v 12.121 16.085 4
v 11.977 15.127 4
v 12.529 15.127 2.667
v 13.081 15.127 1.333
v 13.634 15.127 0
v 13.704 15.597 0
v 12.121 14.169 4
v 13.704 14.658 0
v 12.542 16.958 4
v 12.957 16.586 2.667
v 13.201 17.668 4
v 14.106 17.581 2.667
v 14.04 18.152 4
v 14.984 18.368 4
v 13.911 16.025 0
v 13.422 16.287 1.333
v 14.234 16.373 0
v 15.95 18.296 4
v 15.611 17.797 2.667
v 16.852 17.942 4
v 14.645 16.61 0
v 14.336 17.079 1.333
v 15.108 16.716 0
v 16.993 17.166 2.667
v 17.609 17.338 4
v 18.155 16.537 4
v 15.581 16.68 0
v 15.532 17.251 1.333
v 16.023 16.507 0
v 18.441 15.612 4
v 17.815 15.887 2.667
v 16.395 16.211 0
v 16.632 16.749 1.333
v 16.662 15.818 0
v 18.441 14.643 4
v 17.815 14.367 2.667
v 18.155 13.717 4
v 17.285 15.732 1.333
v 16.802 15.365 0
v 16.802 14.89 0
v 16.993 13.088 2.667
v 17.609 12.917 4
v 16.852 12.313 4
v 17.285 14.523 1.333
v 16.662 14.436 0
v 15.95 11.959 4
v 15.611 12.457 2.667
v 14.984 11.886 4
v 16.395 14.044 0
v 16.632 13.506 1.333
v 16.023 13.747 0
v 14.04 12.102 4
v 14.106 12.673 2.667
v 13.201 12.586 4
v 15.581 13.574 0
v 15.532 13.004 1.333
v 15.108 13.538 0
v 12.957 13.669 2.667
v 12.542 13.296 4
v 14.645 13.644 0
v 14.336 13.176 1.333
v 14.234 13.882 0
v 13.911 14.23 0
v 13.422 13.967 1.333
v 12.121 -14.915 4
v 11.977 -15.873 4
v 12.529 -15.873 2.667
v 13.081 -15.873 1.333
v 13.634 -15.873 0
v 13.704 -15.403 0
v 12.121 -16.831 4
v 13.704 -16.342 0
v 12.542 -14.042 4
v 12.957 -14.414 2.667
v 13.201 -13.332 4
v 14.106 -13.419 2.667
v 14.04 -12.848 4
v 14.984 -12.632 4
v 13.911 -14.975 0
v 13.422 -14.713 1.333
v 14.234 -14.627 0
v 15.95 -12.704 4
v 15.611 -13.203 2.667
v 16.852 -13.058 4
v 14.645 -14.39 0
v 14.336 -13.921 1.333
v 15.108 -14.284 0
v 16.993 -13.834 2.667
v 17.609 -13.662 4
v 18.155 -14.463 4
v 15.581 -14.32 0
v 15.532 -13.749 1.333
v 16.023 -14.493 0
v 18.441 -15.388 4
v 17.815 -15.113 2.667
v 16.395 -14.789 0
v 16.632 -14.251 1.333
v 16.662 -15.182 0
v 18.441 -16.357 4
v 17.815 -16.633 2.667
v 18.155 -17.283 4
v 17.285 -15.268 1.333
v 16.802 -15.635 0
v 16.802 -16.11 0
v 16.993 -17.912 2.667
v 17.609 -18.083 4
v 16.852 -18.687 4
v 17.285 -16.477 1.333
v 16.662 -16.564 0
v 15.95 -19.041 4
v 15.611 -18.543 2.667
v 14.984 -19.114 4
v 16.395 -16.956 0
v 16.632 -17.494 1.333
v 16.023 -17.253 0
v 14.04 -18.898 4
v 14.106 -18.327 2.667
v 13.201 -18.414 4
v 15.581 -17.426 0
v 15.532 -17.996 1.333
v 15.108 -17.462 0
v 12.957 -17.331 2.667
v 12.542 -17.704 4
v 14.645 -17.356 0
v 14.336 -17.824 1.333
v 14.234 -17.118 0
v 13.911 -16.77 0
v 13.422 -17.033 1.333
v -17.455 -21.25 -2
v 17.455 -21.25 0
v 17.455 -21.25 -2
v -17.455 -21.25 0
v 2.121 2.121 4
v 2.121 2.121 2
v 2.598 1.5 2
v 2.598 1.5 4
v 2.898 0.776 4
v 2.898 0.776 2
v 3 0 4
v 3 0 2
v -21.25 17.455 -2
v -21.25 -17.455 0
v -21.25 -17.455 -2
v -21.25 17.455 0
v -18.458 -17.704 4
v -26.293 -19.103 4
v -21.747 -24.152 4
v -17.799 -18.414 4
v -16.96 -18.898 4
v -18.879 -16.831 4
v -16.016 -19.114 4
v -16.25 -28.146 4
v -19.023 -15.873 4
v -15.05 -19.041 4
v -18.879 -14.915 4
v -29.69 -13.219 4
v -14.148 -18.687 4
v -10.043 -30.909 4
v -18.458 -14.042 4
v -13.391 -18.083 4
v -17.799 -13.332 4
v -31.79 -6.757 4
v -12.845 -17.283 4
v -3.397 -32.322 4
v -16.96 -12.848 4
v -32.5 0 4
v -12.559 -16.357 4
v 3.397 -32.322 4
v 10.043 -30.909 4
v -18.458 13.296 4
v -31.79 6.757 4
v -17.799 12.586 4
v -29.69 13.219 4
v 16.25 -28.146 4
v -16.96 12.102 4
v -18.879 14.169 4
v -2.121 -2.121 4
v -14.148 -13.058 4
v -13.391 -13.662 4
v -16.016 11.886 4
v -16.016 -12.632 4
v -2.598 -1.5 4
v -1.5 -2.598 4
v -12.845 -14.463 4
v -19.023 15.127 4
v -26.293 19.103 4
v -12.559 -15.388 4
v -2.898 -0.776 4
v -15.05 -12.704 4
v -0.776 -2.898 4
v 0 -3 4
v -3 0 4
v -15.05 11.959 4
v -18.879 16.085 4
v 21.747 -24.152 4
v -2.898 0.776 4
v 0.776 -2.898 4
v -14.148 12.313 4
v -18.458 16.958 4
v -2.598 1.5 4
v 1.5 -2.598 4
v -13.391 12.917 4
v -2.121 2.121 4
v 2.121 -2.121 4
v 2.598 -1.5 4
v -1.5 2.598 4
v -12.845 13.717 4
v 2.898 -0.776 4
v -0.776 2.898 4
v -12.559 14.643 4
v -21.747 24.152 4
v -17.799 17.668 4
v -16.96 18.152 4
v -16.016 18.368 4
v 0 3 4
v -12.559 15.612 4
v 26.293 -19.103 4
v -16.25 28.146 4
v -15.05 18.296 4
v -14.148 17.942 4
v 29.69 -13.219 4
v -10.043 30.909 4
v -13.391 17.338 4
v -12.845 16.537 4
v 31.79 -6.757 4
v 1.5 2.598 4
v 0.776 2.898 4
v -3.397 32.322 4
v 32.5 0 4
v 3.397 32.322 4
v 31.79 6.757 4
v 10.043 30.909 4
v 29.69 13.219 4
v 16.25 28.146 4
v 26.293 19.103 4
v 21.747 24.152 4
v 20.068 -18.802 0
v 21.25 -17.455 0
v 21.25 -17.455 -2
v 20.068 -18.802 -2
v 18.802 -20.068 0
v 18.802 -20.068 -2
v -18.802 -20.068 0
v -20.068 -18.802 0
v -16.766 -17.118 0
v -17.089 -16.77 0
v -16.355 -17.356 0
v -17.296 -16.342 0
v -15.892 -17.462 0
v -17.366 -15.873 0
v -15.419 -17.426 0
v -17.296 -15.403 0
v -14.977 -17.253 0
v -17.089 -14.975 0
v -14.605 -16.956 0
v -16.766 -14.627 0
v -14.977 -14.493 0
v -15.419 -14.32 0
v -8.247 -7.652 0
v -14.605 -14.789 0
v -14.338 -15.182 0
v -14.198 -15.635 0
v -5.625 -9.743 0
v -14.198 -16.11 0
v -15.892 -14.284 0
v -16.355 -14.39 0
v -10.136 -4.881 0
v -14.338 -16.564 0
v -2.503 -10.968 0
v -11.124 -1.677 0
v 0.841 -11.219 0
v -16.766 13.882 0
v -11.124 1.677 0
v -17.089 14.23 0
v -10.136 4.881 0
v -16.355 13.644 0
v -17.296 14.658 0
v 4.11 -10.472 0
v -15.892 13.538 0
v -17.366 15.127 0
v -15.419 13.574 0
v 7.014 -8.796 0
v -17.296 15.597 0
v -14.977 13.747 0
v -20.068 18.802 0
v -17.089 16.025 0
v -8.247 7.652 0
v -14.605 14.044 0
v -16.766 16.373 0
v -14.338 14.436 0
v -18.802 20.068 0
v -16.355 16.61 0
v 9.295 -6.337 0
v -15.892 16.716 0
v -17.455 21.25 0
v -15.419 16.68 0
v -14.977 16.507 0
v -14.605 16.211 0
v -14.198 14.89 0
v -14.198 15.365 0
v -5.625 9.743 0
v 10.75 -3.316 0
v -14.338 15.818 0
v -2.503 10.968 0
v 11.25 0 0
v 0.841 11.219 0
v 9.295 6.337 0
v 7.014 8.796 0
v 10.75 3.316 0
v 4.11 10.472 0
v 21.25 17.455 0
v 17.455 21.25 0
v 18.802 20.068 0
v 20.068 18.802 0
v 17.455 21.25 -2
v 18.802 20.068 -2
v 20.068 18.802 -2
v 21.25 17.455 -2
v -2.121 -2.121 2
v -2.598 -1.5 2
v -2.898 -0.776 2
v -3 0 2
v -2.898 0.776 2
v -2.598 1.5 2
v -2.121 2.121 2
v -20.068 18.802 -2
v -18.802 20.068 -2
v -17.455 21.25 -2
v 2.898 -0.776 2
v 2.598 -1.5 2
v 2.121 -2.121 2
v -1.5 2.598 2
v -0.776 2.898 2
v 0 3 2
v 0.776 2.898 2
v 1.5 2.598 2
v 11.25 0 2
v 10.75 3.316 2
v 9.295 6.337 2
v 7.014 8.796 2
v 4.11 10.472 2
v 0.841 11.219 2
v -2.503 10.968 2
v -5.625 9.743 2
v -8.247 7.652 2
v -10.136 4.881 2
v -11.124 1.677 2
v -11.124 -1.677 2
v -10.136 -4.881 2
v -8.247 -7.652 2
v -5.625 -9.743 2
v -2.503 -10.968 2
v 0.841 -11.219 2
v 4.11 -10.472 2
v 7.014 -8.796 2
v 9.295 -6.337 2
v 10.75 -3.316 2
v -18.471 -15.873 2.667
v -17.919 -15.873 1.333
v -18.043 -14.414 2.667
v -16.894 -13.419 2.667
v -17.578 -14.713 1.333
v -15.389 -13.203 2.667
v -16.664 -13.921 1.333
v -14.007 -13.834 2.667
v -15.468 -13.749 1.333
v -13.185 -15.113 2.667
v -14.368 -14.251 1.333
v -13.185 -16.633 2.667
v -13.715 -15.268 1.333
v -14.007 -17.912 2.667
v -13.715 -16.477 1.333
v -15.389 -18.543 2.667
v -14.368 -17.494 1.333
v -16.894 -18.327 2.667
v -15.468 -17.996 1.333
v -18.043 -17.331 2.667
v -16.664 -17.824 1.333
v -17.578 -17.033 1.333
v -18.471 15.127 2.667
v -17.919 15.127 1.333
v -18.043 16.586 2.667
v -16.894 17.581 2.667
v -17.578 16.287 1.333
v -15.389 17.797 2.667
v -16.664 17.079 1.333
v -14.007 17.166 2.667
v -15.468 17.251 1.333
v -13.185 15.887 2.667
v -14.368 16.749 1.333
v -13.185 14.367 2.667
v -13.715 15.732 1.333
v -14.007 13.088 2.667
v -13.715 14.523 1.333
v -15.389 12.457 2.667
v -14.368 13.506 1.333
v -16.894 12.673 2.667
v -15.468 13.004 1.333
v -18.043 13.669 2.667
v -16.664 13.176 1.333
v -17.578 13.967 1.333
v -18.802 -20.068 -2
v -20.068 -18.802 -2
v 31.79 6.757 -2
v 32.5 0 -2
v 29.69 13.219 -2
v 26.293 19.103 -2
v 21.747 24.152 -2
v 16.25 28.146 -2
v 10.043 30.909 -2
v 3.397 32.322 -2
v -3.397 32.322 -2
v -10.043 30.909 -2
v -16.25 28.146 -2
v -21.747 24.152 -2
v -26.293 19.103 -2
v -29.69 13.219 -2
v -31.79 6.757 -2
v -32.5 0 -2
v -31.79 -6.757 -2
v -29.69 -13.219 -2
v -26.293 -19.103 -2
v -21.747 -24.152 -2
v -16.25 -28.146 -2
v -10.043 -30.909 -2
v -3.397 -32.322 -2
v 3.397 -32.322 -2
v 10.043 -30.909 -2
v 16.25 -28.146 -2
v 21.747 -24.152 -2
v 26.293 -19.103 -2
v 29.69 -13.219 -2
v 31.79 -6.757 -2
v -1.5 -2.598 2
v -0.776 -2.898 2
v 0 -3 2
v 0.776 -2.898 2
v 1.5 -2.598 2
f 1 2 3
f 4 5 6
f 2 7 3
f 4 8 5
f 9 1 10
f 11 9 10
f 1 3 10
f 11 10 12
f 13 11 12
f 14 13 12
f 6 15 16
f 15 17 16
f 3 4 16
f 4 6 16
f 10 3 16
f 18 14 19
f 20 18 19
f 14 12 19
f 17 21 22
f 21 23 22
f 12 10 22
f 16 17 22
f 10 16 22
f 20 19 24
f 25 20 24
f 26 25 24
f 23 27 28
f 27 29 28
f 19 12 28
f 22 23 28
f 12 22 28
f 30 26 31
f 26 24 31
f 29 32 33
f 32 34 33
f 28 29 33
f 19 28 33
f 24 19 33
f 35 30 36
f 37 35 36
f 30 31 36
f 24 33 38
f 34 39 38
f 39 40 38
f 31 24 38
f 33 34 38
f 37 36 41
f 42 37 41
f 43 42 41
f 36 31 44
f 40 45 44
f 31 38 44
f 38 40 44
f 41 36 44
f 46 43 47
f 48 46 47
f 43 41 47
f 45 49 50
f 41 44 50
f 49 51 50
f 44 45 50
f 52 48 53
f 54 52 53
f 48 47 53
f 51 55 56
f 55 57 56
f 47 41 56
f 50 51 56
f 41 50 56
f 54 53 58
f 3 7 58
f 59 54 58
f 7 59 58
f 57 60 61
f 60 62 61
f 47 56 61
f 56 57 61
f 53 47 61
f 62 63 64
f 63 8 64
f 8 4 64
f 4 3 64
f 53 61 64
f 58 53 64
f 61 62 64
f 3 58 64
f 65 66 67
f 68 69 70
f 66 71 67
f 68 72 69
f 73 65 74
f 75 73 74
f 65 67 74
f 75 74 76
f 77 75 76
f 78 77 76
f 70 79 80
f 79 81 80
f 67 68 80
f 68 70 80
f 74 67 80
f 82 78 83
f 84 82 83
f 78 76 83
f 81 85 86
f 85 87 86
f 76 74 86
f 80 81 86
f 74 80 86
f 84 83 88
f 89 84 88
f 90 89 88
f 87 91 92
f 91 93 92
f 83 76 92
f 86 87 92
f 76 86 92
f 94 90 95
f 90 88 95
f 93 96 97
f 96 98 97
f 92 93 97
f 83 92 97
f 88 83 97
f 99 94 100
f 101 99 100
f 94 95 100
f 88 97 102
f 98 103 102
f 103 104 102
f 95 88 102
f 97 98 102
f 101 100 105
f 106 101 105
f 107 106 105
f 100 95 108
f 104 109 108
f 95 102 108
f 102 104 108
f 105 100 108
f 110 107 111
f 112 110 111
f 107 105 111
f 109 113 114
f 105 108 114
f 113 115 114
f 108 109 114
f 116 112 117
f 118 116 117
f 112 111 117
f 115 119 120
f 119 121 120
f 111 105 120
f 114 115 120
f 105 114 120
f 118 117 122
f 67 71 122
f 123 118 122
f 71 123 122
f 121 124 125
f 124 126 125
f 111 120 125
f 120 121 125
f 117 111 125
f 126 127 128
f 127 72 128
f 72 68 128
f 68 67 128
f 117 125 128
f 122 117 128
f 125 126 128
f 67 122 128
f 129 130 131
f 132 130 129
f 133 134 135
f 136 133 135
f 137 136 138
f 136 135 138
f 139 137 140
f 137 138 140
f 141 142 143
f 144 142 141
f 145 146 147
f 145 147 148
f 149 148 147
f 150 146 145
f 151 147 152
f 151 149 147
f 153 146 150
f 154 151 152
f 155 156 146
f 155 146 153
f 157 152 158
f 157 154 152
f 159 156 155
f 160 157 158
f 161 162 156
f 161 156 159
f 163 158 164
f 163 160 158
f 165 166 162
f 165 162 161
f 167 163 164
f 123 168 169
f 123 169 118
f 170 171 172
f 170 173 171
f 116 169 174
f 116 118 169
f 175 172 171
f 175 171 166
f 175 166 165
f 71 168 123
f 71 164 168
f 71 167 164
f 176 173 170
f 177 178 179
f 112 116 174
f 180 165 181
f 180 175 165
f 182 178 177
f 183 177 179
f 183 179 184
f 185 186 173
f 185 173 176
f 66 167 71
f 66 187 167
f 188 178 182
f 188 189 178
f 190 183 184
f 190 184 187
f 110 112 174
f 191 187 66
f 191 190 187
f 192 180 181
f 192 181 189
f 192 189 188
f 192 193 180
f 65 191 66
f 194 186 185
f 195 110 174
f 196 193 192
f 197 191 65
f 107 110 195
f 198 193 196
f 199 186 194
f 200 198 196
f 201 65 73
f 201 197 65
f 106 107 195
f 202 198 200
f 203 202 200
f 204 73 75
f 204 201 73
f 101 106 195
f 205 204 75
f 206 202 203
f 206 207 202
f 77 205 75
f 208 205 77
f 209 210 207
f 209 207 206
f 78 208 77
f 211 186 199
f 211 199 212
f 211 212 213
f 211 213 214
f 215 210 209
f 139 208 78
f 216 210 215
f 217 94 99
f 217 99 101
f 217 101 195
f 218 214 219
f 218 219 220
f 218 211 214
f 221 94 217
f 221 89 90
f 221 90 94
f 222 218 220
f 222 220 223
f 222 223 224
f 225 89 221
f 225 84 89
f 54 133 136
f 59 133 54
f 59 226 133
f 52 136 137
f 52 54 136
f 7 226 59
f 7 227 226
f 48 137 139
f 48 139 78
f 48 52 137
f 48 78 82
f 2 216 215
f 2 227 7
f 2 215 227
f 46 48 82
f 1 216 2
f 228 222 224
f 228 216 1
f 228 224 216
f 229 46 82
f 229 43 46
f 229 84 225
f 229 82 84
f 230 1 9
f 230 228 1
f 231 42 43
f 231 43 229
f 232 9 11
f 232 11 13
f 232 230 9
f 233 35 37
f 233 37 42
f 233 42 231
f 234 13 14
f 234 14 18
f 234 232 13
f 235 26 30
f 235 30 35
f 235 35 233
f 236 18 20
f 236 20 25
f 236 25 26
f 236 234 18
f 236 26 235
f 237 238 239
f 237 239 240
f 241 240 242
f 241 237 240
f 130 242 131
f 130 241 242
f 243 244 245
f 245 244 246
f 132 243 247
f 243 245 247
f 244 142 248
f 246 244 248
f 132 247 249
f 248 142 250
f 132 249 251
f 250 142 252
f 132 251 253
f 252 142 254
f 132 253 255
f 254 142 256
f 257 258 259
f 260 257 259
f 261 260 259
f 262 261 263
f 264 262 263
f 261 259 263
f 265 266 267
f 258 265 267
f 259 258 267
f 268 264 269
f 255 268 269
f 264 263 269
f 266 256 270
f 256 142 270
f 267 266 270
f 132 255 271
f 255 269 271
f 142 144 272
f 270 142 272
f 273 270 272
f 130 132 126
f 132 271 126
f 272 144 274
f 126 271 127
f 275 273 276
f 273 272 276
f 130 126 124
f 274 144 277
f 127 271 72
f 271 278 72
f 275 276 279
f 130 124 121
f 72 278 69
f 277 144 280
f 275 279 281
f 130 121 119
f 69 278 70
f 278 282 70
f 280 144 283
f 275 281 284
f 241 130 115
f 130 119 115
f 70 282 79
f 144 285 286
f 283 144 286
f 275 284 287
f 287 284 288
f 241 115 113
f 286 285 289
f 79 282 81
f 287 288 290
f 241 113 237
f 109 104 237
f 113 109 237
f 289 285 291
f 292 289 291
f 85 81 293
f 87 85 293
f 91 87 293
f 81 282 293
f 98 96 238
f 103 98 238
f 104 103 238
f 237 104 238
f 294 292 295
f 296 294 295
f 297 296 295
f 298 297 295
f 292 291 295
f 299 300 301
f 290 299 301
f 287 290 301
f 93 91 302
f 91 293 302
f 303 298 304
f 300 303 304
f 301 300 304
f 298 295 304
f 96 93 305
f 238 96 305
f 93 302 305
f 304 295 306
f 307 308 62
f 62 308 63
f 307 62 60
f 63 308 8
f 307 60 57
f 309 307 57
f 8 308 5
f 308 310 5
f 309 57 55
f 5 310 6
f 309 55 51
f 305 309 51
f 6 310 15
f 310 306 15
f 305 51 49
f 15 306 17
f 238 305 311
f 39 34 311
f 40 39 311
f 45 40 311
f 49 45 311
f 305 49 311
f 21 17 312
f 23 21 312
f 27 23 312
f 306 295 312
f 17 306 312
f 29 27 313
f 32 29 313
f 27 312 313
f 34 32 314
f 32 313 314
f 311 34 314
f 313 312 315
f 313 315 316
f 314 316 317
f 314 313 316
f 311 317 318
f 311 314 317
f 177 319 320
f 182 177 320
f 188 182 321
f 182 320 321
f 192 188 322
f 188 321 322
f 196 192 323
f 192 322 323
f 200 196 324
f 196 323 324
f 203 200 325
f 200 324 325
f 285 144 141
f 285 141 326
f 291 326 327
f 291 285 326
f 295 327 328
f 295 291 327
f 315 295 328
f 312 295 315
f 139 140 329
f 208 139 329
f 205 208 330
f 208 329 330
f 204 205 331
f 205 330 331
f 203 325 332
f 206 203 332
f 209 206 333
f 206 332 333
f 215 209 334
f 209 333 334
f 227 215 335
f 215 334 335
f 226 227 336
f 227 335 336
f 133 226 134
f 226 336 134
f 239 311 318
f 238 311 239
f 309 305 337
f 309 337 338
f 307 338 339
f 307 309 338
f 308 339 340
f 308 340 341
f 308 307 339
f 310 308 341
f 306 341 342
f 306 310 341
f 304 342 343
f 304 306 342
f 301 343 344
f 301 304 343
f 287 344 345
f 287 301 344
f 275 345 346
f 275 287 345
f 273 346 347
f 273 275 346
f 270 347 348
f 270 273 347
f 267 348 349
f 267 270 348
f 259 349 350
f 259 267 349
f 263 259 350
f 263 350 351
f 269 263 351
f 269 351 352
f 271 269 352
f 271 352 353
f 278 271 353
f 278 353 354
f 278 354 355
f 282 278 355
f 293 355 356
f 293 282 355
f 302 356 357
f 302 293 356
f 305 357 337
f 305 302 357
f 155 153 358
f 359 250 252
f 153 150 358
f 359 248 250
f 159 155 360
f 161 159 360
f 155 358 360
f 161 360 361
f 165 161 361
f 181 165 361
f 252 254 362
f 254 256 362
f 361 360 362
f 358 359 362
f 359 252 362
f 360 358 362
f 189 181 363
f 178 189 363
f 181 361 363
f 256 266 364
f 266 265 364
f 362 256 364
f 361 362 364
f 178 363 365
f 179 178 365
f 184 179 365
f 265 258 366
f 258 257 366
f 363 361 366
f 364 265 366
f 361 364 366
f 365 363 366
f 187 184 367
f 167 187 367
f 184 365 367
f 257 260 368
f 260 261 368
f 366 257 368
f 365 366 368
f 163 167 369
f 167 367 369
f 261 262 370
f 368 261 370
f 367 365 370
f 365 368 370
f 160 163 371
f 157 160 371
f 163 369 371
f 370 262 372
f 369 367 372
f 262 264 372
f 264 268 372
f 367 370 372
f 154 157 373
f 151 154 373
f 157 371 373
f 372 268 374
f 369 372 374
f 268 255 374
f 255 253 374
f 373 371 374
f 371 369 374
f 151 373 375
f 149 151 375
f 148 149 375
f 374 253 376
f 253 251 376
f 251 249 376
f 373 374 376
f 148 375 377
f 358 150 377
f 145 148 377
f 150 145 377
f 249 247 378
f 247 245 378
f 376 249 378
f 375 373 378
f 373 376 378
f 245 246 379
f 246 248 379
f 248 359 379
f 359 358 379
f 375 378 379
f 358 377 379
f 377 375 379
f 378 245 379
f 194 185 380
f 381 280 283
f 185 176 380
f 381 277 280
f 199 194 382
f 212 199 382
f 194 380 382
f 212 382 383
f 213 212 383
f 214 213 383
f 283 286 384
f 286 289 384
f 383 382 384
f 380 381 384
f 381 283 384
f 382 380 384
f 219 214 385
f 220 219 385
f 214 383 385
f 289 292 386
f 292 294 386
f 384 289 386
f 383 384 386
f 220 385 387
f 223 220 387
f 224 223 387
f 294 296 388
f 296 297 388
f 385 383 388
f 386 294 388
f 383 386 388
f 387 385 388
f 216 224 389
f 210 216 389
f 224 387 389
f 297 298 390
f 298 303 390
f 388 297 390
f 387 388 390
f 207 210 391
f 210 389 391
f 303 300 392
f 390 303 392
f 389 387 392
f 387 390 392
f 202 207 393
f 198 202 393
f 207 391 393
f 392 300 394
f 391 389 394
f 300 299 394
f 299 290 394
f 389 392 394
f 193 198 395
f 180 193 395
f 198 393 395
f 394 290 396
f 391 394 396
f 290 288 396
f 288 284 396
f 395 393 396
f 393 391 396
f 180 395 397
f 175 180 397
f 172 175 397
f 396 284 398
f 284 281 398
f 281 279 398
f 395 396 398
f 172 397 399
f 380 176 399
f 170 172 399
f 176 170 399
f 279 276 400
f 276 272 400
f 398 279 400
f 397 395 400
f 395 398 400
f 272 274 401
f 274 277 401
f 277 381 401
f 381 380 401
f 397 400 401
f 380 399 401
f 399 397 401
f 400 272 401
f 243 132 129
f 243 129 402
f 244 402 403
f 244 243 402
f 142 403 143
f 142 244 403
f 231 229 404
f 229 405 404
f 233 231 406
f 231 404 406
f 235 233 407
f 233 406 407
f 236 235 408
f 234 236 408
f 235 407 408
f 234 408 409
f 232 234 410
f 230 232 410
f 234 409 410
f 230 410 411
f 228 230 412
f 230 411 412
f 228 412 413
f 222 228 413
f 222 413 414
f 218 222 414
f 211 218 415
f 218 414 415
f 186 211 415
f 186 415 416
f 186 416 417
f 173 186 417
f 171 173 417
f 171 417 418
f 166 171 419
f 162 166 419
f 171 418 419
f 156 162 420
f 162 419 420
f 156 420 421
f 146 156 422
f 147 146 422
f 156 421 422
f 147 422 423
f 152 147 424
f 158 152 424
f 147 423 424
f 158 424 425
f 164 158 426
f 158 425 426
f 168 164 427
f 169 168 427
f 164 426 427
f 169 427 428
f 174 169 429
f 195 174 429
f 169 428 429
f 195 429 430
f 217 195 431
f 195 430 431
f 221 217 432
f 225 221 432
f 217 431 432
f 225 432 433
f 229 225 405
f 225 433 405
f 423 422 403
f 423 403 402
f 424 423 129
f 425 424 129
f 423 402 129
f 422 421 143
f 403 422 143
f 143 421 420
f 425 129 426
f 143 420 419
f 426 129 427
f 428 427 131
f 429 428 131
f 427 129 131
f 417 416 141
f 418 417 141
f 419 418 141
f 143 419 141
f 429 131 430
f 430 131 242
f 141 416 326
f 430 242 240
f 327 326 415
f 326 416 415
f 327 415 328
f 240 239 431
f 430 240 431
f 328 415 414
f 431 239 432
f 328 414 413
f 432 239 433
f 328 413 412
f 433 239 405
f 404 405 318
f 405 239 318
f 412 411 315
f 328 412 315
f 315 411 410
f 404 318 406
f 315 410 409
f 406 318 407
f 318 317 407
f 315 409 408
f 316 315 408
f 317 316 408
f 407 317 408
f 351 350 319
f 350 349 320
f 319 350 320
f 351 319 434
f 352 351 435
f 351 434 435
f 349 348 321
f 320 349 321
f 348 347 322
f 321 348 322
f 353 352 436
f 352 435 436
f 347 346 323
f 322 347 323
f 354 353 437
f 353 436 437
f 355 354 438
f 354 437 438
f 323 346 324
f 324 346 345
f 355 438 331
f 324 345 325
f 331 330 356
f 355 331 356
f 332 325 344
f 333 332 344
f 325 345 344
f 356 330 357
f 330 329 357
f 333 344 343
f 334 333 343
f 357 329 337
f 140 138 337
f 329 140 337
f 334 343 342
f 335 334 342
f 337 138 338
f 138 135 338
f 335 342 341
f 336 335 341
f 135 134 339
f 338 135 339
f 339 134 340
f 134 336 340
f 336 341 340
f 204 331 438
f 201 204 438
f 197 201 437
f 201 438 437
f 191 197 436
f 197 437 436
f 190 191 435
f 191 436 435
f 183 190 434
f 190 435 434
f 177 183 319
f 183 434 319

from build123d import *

# Parameters (mm, degrees)
F0_R           = 32.5
F0_R_2         = 11.25
F1_DEPTH       = 2
F2_DEPTH       = 2
F3_R           = 32.5
F4_DEPTH       = 2
F6_D           = 3
F6_DEPTH       = 12
F6_CSINK_D     = 6.5
F6_CSINK_ANGLE = 45
F6_TIP         = 0.9012909285


with BuildPart() as f1:
    # F0 (on Top) → F1 (new body)
    with BuildSketch(Plane.XY):
        Circle(F0_R)
        with BuildLine():
            Line((-21.25, 17.4553000547), (-21.25, 21.25))
            Line((-21.25, 21.25), (-17.4553000547, 21.25))
            ThreePointArc((-17.4553000547, 21.25), (0, 27.5), (17.4553000547, 21.25))
            Line((17.4553000547, 21.25), (21.25, 21.25))
            Line((21.25, 21.25), (21.25, 17.4553000547))
            ThreePointArc((21.25, 17.4553000547), (25.8903939715, 9.2702481089), (27.5, 0))
            ThreePointArc((27.5, 0), (25.8903939715, -9.2702481089), (21.25, -17.4553000547))
            Line((21.25, -17.4553000547), (21.25, -21.25))
            Line((21.25, -21.25), (17.4553000547, -21.25))
            ThreePointArc((17.4553000547, -21.25), (0, -27.5), (-17.4553000547, -21.25))
            Line((-17.4553000547, -21.25), (-21.25, -21.25))
            Line((-21.25, -21.25), (-21.25, -17.4553000547))
            ThreePointArc((-21.25, -17.4553000547), (-27.5, 0), (-21.25, 17.4553000547))
        make_face(mode=Mode.SUBTRACT)
        with BuildLine():
            Line((-17.4553000547, 21.25), (-21.25, 21.25))
            Line((-21.25, 21.25), (-21.25, 17.4553000547))
            ThreePointArc((-21.25, 17.4553000547), (-19.4454364826, 19.4454364826), (-17.4553000547, 21.25))
        make_face()
        with BuildLine():
            Line((21.25, 21.25), (17.4553000547, 21.25))
            ThreePointArc((17.4553000547, 21.25), (19.4454364826, 19.4454364826), (21.25, 17.4553000547))
            Line((21.25, 17.4553000547), (21.25, 21.25))
        make_face()
        with BuildLine():
            Line((21.25, -21.25), (21.25, -17.4553000547))
            ThreePointArc((21.25, -17.4553000547), (19.4454364826, -19.4454364826), (17.4553000547, -21.25))
            Line((17.4553000547, -21.25), (21.25, -21.25))
        make_face()
        with BuildLine():
            ThreePointArc((-17.4553000547, -21.25), (-19.4454364826, -19.4454364826), (-21.25, -17.4553000547))
            Line((-21.25, -17.4553000547), (-21.25, -21.25))
            Line((-21.25, -21.25), (-17.4553000547, -21.25))
        make_face()
        with BuildLine():
            Line((17.4553000547, -21.25), (-17.4553000547, -21.25))
            ThreePointArc((-17.4553000547, -21.25), (0, -27.5), (17.4553000547, -21.25))
        make_face()
        with BuildLine():
            ThreePointArc((27.5, 0), (25.8903939715, 9.2702481089), (21.25, 17.4553000547))
            Line((21.25, 17.4553000547), (21.25, -17.4553000547))
            ThreePointArc((21.25, -17.4553000547), (25.8903939715, -9.2702481089), (27.5, 0))
        make_face()
        with BuildLine():
            ThreePointArc((17.4553000547, 21.25), (0, 27.5), (-17.4553000547, 21.25))
            Line((-17.4553000547, 21.25), (17.4553000547, 21.25))
        make_face()
        with BuildLine():
            Line((-21.25, -17.4553000547), (-21.25, 17.4553000547))
            ThreePointArc((-21.25, 17.4553000547), (-27.5, 0), (-21.25, -17.4553000547))
        make_face()
        with BuildLine():
            Line((17.4553000547, 21.25), (-17.4553000547, 21.25))
            ThreePointArc((-17.4553000547, 21.25), (-19.4454364826, 19.4454364826), (-21.25, 17.4553000547))
            Line((-21.25, 17.4553000547), (-21.25, -17.4553000547))
            ThreePointArc((-21.25, -17.4553000547), (-19.4454364826, -19.4454364826), (-17.4553000547, -21.25))
            Line((-17.4553000547, -21.25), (17.4553000547, -21.25))
            ThreePointArc((17.4553000547, -21.25), (19.4454364826, -19.4454364826), (21.25, -17.4553000547))
            Line((21.25, -17.4553000547), (21.25, 17.4553000547))
            ThreePointArc((21.25, 17.4553000547), (19.4454364826, 19.4454364826), (17.4553000547, 21.25))
        make_face()
        Circle(F0_R_2, mode=Mode.SUBTRACT)
    extrude(amount=F1_DEPTH)

    # F0 (on Top) → F2 (join)
    with BuildSketch(Plane.XY):
        Circle(F0_R)
        with BuildLine():
            Line((-21.25, 17.4553000547), (-21.25, 21.25))
            Line((-21.25, 21.25), (-17.4553000547, 21.25))
            ThreePointArc((-17.4553000547, 21.25), (0, 27.5), (17.4553000547, 21.25))
            Line((17.4553000547, 21.25), (21.25, 21.25))
            Line((21.25, 21.25), (21.25, 17.4553000547))
            ThreePointArc((21.25, 17.4553000547), (25.8903939715, 9.2702481089), (27.5, 0))
            ThreePointArc((27.5, 0), (25.8903939715, -9.2702481089), (21.25, -17.4553000547))
            Line((21.25, -17.4553000547), (21.25, -21.25))
            Line((21.25, -21.25), (17.4553000547, -21.25))
            ThreePointArc((17.4553000547, -21.25), (0, -27.5), (-17.4553000547, -21.25))
            Line((-17.4553000547, -21.25), (-21.25, -21.25))
            Line((-21.25, -21.25), (-21.25, -17.4553000547))
            ThreePointArc((-21.25, -17.4553000547), (-27.5, 0), (-21.25, 17.4553000547))
        make_face(mode=Mode.SUBTRACT)
        with BuildLine():
            Line((-21.25, -17.4553000547), (-21.25, 17.4553000547))
            ThreePointArc((-21.25, 17.4553000547), (-27.5, 0), (-21.25, -17.4553000547))
        make_face()
        with BuildLine():
            Line((17.4553000547, -21.25), (-17.4553000547, -21.25))
            ThreePointArc((-17.4553000547, -21.25), (0, -27.5), (17.4553000547, -21.25))
        make_face()
        with BuildLine():
            ThreePointArc((27.5, 0), (25.8903939715, 9.2702481089), (21.25, 17.4553000547))
            Line((21.25, 17.4553000547), (21.25, -17.4553000547))
            ThreePointArc((21.25, -17.4553000547), (25.8903939715, -9.2702481089), (27.5, 0))
        make_face()
        with BuildLine():
            ThreePointArc((17.4553000547, 21.25), (0, 27.5), (-17.4553000547, 21.25))
            Line((-17.4553000547, 21.25), (17.4553000547, 21.25))
        make_face()
        with BuildLine():
            ThreePointArc((-17.4553000547, -21.25), (-19.4454364826, -19.4454364826), (-21.25, -17.4553000547))
            Line((-21.25, -17.4553000547), (-21.25, -21.25))
            Line((-21.25, -21.25), (-17.4553000547, -21.25))
        make_face()
        with BuildLine():
            Line((21.25, -21.25), (21.25, -17.4553000547))
            ThreePointArc((21.25, -17.4553000547), (19.4454364826, -19.4454364826), (17.4553000547, -21.25))
            Line((17.4553000547, -21.25), (21.25, -21.25))
        make_face()
        with BuildLine():
            Line((21.25, 21.25), (17.4553000547, 21.25))
            ThreePointArc((17.4553000547, 21.25), (19.4454364826, 19.4454364826), (21.25, 17.4553000547))
            Line((21.25, 17.4553000547), (21.25, 21.25))
        make_face()
        with BuildLine():
            Line((-17.4553000547, 21.25), (-21.25, 21.25))
            Line((-21.25, 21.25), (-21.25, 17.4553000547))
            ThreePointArc((-21.25, 17.4553000547), (-19.4454364826, 19.4454364826), (-17.4553000547, 21.25))
        make_face()
    extrude(amount=-F2_DEPTH)

    # F3 (on face) → F4 (join)
    with BuildSketch(Plane.XY.offset(2)):
        Circle(F3_R)
        with BuildLine():
            ThreePointArc((-7.9549512883, 7.9549512883), (0, 11.25), (7.9549512883, 7.9549512883))
            ThreePointArc((7.9549512883, 7.9549512883), (10.3936447408, 4.3051886141), (11.25, 0))
            ThreePointArc((11.25, 0), (10.3936447408, -4.3051886141), (7.9549512883, -7.9549512883))
            ThreePointArc((7.9549512883, -7.9549512883), (0, -11.25), (-7.9549512883, -7.9549512883))
            ThreePointArc((-7.9549512883, -7.9549512883), (-11.25, 0), (-7.9549512883, 7.9549512883))
        make_face(mode=Mode.SUBTRACT)
        with BuildLine():
            ThreePointArc((-2.1213203436, 2.1213203436), (0, 3), (2.1213203436, 2.1213203436))
            Line((2.1213203436, 2.1213203436), (7.9549512883, 7.9549512883))
            ThreePointArc((7.9549512883, 7.9549512883), (0, 11.25), (-7.9549512883, 7.9549512883))
            Line((-7.9549512883, 7.9549512883), (-2.1213203436, 2.1213203436))
        make_face()
        with BuildLine():
            ThreePointArc((-2.1213203436, -2.1213203436), (-3, 0), (-2.1213203436, 2.1213203436))
            Line((-2.1213203436, 2.1213203436), (-7.9549512883, 7.9549512883))
            ThreePointArc((-7.9549512883, 7.9549512883), (-11.25, 0), (-7.9549512883, -7.9549512883))
            Line((-7.9549512883, -7.9549512883), (-2.1213203436, -2.1213203436))
        make_face()
        with BuildLine():
            Line((7.9549512883, -7.9549512883), (2.1213203436, -2.1213203436))
            ThreePointArc((2.1213203436, -2.1213203436), (0, -3), (-2.1213203436, -2.1213203436))
            Line((-2.1213203436, -2.1213203436), (-7.9549512883, -7.9549512883))
            ThreePointArc((-7.9549512883, -7.9549512883), (0, -11.25), (7.9549512883, -7.9549512883))
        make_face()
        with BuildLine():
            ThreePointArc((2.1213203436, 2.1213203436), (2.7716385975, 1.1480502971), (3, 0))
            ThreePointArc((3, 0), (2.7716385975, -1.1480502971), (2.1213203436, -2.1213203436))
            Line((2.1213203436, -2.1213203436), (7.9549512883, -7.9549512883))
            ThreePointArc((7.9549512883, -7.9549512883), (10.3936447408, -4.3051886141), (11.25, 0))
            ThreePointArc((11.25, 0), (10.3936447408, 4.3051886141), (7.9549512883, 7.9549512883))
            Line((7.9549512883, 7.9549512883), (2.1213203436, 2.1213203436))
        make_face()
    extrude(amount=F4_DEPTH)

    # F6
    with Locations(Plane.XY.offset(4)):
        with Locations((-15.7731351997, 15.1271263808), (-15.7731351997, -15.8728736192), (15.2268648003, -15.8728736192), (15.2268648003, 15.1271263808)):
            CounterSinkHole(F6_D / 2, F6_CSINK_D / 2, depth=F6_DEPTH, counter_sink_angle=F6_CSINK_ANGLE)
            with Locations((0, 0, -(F6_DEPTH + F6_TIP / 2))):  # 118° drill point
                Cone(0, F6_D / 2, F6_TIP, mode=Mode.SUBTRACT)


solid = f1.part
